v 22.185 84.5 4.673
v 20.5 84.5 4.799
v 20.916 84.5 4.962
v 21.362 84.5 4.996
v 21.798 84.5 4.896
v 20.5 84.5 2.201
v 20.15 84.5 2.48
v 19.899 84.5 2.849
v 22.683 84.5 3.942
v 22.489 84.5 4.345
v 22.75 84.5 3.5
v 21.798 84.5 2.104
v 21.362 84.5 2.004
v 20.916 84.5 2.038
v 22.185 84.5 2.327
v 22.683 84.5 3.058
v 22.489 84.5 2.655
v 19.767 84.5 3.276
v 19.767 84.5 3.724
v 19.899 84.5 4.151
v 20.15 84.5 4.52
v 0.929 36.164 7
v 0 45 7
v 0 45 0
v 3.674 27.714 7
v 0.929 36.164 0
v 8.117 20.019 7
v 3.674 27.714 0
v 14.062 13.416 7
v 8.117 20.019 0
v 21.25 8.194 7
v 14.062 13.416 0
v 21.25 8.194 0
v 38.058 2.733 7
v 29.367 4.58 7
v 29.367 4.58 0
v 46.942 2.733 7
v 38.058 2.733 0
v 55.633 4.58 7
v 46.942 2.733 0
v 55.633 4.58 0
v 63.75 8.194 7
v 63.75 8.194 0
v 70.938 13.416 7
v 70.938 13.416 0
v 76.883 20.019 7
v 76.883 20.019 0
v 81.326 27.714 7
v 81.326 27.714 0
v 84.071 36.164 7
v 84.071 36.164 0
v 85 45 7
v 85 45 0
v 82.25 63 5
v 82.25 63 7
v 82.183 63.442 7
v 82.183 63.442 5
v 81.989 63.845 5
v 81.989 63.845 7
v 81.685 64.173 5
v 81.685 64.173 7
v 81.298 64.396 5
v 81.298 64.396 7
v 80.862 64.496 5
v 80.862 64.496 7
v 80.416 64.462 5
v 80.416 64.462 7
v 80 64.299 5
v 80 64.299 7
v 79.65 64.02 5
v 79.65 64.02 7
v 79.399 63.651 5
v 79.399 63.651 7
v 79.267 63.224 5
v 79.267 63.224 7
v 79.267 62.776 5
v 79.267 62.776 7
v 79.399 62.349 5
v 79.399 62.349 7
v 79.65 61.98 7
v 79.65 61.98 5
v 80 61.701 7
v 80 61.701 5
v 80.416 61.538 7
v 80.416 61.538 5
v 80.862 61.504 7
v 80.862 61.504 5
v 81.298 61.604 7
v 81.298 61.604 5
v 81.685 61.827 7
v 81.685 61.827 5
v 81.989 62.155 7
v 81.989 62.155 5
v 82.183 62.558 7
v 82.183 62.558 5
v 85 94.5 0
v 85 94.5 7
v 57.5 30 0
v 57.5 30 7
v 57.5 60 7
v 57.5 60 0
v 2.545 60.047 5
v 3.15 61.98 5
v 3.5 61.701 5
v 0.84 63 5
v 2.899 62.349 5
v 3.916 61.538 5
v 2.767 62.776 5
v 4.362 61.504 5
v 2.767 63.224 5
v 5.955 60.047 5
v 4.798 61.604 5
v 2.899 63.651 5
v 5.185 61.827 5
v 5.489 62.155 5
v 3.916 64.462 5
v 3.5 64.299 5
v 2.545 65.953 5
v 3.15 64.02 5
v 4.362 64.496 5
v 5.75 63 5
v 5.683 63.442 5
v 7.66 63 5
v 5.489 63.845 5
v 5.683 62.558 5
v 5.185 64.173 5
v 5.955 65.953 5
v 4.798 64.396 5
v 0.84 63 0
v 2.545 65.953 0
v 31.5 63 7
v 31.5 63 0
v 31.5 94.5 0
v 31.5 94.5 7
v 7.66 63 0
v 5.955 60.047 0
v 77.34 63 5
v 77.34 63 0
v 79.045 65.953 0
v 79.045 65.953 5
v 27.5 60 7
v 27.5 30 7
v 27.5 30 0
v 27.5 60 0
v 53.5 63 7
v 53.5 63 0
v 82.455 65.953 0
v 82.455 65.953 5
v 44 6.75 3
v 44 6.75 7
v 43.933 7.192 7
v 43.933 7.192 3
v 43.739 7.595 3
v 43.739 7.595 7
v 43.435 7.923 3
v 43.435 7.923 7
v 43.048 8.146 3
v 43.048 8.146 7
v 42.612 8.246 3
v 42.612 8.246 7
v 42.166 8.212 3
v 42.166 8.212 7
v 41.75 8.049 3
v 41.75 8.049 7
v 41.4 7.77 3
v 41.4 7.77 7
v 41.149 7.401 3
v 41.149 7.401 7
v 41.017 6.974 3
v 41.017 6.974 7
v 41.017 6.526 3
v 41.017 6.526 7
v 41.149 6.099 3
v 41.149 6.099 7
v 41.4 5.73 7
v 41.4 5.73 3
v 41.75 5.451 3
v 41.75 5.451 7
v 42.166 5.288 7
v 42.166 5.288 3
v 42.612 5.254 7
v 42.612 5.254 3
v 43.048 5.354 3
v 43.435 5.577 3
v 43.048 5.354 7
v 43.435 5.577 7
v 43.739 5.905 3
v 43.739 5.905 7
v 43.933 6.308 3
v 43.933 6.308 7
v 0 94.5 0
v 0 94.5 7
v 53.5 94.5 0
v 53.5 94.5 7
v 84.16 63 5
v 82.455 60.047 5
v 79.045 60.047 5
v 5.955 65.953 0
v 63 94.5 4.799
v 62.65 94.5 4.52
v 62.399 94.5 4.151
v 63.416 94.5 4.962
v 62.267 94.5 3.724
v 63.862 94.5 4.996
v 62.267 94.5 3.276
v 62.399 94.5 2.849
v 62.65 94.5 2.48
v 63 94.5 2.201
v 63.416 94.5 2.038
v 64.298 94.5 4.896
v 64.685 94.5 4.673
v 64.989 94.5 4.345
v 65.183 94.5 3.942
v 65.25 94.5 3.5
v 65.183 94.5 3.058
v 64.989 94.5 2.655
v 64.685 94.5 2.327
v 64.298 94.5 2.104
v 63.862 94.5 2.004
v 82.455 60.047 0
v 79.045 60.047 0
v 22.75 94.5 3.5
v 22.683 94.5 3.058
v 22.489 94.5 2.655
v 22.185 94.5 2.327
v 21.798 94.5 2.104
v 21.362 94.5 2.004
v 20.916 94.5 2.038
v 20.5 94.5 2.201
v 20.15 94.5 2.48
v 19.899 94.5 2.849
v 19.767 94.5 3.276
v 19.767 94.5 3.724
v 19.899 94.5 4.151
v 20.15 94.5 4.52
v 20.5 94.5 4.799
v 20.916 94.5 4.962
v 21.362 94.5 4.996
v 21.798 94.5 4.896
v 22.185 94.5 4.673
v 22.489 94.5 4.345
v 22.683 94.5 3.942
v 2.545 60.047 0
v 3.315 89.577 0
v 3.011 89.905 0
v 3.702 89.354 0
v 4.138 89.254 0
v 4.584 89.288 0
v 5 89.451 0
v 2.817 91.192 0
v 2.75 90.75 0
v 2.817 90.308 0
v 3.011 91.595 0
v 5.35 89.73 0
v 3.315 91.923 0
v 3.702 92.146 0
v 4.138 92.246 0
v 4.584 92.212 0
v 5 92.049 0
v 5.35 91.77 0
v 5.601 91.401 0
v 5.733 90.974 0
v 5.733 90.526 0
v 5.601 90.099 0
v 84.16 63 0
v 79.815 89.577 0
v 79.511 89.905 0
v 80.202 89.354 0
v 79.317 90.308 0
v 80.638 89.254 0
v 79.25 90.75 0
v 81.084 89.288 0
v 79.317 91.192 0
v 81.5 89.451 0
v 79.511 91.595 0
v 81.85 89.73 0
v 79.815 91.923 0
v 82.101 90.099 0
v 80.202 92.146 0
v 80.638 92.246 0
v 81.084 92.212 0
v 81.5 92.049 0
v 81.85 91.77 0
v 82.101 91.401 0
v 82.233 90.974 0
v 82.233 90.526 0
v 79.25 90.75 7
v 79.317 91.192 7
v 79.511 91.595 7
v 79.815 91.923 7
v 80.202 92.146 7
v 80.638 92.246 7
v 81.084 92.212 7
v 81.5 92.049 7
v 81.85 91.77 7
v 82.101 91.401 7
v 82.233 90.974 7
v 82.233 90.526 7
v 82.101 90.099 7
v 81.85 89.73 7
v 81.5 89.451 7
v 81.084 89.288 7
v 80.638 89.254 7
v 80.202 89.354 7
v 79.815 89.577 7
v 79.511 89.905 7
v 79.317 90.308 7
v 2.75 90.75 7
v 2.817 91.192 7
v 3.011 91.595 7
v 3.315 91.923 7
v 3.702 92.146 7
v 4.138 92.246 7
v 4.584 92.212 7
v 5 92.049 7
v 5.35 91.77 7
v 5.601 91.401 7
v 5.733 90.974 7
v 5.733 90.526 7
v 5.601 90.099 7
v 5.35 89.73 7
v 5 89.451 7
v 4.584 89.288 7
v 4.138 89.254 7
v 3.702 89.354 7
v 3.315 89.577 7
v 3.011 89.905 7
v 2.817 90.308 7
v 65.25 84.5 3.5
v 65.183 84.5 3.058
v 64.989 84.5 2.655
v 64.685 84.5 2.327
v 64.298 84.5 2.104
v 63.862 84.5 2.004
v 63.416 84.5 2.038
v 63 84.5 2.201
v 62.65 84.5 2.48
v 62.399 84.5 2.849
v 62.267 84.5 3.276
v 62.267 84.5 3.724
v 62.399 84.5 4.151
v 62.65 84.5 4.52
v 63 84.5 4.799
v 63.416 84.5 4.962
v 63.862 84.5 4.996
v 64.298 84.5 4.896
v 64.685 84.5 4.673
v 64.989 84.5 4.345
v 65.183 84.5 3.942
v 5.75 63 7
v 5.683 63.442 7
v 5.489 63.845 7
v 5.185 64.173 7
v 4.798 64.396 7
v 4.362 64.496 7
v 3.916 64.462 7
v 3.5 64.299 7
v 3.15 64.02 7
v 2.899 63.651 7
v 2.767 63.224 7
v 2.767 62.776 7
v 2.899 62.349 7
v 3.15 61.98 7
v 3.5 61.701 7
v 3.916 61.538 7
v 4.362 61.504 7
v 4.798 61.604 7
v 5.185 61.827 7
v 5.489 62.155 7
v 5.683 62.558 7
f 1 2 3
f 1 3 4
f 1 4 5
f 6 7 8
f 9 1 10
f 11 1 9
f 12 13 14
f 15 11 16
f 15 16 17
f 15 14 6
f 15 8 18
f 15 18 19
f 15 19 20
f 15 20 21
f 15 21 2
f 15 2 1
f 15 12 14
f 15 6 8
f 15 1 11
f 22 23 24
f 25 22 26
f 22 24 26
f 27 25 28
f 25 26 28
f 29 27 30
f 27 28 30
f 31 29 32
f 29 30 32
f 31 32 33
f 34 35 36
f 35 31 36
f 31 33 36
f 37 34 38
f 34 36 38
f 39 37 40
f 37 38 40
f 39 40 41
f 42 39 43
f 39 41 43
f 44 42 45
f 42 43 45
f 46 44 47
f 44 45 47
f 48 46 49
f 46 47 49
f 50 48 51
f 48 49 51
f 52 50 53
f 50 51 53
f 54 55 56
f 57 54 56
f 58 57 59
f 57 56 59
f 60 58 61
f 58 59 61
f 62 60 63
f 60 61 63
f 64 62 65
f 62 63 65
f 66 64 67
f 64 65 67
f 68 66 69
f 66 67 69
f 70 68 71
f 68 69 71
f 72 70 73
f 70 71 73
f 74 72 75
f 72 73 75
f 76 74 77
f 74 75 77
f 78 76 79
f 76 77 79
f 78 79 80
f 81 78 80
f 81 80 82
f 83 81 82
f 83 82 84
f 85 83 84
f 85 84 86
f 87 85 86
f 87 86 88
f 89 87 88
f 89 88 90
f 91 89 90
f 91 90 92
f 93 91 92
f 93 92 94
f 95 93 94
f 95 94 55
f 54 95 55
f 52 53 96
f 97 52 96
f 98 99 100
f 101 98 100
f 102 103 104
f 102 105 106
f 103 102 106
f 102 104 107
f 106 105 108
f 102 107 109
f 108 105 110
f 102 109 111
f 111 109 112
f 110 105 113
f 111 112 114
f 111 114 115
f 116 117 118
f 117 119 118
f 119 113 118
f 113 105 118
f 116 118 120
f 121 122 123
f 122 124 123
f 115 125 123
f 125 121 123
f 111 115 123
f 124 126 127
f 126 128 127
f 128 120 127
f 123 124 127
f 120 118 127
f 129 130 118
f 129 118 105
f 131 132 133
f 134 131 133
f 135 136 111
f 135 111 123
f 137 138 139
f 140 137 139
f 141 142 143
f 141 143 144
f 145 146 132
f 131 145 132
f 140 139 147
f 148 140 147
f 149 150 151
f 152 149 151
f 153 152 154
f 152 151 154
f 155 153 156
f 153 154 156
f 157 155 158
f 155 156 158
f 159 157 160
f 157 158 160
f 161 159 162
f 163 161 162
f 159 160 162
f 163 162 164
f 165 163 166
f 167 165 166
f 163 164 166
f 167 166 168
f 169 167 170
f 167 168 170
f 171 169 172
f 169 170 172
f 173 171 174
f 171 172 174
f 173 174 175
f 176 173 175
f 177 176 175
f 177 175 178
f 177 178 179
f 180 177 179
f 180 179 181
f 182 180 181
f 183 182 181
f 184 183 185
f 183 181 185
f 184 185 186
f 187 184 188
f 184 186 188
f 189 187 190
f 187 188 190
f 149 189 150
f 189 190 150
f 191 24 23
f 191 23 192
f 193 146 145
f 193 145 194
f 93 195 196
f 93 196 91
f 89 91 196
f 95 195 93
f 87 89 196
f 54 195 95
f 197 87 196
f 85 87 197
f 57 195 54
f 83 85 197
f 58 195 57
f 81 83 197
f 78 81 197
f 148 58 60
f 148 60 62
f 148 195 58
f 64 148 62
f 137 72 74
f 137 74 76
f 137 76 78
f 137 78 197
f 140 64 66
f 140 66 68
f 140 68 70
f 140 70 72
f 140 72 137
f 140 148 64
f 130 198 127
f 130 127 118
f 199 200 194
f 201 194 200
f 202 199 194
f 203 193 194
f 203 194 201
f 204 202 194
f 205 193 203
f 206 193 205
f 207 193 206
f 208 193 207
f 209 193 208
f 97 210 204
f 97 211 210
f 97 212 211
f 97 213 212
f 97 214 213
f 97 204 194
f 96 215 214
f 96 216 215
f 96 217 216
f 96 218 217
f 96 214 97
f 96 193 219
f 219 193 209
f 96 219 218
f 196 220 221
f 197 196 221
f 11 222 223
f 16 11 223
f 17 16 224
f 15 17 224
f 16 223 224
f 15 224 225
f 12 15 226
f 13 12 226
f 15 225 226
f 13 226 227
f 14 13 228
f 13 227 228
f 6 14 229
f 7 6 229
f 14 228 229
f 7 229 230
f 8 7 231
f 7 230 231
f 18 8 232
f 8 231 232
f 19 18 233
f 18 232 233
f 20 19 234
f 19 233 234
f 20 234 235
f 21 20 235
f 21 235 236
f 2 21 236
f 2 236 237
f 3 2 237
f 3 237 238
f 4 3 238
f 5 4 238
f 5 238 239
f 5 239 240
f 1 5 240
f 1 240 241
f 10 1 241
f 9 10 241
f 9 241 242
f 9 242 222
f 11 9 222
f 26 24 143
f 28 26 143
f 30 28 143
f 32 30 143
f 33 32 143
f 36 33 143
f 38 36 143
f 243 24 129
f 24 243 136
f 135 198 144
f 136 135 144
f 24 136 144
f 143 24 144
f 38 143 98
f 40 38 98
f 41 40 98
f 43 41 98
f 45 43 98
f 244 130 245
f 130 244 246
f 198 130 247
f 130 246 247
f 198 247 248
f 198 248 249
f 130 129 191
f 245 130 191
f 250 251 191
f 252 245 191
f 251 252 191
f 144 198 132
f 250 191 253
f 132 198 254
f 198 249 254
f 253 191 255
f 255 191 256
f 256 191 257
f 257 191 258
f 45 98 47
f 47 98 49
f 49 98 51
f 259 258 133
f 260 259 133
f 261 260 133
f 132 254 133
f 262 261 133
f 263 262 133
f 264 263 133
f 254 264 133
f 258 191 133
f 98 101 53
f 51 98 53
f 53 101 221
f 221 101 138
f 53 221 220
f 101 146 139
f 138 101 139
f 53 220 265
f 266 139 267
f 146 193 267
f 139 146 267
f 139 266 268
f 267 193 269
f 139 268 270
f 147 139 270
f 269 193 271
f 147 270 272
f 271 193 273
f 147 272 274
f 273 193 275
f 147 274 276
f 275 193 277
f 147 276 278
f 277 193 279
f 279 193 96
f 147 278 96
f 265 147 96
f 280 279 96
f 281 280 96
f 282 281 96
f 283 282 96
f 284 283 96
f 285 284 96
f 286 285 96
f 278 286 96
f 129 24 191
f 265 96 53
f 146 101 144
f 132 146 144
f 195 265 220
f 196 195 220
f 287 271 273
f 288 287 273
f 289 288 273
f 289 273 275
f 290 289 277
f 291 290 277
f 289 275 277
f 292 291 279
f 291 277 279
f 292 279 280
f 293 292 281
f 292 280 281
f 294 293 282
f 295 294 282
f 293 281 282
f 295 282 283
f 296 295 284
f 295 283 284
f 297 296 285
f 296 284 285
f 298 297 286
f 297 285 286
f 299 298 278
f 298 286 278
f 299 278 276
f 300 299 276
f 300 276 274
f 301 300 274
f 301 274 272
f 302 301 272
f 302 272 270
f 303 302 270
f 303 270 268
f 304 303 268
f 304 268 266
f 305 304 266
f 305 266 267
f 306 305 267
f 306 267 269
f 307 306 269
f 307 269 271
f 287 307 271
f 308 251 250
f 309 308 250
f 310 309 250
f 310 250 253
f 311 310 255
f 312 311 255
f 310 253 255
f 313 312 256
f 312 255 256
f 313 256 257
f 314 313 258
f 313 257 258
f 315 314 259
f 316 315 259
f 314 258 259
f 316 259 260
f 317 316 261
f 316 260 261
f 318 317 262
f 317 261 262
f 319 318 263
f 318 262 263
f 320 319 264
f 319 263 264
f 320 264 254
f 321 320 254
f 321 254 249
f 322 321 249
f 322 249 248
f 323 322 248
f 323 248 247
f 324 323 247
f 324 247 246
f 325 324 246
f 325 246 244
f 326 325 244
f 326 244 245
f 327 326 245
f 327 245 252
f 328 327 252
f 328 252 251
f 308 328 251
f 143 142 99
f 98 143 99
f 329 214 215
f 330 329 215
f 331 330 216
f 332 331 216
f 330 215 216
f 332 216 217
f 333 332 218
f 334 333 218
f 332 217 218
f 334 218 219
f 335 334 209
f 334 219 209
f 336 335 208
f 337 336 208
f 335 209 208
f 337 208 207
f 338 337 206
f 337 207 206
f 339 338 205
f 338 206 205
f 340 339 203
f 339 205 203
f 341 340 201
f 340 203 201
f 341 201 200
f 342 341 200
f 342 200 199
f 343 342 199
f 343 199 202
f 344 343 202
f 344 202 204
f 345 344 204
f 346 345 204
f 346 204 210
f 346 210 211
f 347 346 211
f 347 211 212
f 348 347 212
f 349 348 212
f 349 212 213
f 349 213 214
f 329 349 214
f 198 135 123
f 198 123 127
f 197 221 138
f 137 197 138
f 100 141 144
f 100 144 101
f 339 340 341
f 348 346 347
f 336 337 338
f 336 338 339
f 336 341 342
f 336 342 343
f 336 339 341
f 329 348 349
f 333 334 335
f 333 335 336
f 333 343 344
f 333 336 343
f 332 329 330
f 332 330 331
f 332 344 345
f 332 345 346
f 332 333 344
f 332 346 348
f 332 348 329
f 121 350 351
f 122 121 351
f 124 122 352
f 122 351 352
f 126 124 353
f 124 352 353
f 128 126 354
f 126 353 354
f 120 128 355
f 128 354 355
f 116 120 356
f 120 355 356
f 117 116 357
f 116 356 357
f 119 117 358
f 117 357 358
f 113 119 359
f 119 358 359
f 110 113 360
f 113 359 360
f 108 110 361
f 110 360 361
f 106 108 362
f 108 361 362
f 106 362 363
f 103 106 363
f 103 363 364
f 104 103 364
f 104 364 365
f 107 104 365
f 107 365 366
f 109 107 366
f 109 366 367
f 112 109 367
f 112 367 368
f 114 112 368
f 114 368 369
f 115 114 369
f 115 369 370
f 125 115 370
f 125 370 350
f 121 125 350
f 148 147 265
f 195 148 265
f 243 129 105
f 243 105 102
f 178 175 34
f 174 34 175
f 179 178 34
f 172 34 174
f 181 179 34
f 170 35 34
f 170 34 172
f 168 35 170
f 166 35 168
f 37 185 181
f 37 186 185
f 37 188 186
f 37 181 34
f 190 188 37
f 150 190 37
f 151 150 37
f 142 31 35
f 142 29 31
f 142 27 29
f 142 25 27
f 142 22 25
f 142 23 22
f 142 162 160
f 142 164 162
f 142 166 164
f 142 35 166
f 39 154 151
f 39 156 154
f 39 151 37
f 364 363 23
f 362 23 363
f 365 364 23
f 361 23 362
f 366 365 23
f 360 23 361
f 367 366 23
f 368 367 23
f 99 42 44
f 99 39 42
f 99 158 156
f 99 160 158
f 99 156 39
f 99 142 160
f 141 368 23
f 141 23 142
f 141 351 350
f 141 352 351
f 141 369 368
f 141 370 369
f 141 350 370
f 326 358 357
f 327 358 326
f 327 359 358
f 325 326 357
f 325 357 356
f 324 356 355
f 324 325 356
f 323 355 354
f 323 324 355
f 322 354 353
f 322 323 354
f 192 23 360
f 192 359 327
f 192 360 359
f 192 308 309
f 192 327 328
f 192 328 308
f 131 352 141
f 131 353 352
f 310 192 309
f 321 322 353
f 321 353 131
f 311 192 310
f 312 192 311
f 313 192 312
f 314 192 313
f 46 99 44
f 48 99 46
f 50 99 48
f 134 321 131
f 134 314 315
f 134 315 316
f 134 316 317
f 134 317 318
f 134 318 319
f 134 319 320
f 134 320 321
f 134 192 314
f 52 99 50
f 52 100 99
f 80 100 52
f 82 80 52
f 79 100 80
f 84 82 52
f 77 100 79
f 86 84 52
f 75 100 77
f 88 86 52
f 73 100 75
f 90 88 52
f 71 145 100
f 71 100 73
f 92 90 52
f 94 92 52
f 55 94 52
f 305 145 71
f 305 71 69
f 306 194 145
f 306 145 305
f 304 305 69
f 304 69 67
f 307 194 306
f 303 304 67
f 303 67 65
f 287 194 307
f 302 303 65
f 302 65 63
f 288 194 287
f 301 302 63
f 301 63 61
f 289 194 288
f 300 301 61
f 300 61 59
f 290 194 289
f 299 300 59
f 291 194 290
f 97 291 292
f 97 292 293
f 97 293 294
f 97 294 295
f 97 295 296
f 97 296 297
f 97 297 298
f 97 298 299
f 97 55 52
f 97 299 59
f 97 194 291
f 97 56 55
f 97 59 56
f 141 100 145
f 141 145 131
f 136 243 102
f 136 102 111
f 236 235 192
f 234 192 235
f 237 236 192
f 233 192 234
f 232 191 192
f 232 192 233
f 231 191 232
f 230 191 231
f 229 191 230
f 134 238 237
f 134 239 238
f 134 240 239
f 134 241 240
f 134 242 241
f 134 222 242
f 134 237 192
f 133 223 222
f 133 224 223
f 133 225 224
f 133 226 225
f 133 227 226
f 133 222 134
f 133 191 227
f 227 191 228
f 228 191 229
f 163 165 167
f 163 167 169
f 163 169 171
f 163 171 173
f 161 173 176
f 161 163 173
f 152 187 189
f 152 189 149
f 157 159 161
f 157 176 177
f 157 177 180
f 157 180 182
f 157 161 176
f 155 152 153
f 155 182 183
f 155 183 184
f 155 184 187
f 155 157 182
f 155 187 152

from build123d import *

# Parameters (mm, degrees)
SKETCH1_W           = 85
SKETCH1_H           = 95
BOSS_EXTRUDE1_DEPTH = 7
SKETCH2_W           = 30
SKETCH2_H           = 30
CUT_EXTRUDE1_DEPTH  = 7
SKETCH4_R           = 1.5
CUT_EXTRUDE2_DEPTH  = 10.5
SKETCH6_R           = 1.5
CUT_EXTRUDE3_DEPTH  = 8
CUT_EXTRUDE4_DEPTH  = 10
SKETCH8_R           = 1.5
CUT_EXTRUDE5_DEPTH  = 10
CUT_EXTRUDE6_DEPTH  = 5
SKETCH11_R          = 1.5
CUT_EXTRUDE8_DEPTH  = 4
SKETCH12_W          = 22
SKETCH12_H          = 32
CUT_EXTRUDE9_DEPTH  = 10
SKETCH13_W          = 31.5
SKETCH13_H          = 7
SKETCH13_R          = 1.5
CUT_EXTRUDE10_DEPTH = 0.5


with BuildPart() as part:
    # Sketch1 → Boss-Extrude1 (new body)
    with BuildSketch(Plane.XY):
        with Locations((42.5, 47.5)):
            Rectangle(SKETCH1_W, SKETCH1_H)
    extrude(amount=BOSS_EXTRUDE1_DEPTH)

    # Sketch2 → Cut-Extrude1 (cut)
    with BuildSketch(Plane.XY.offset(7)):
        with Locations((42.5, 45)):
            Rectangle(SKETCH2_W, SKETCH2_H)
    extrude(amount=-CUT_EXTRUDE1_DEPTH, mode=Mode.SUBTRACT)

    # Sketch4 → Cut-Extrude2 (cut)
    with BuildSketch(Plane(origin=(0, 95, 0), x_dir=(1, 0, 0), z_dir=(0, 1, 0))):
        with Locations((21.25, -3.5)):
            Circle(SKETCH4_R)
        with Locations((63.75, -3.5)):
            Circle(SKETCH4_R)
    extrude(amount=-CUT_EXTRUDE2_DEPTH, mode=Mode.SUBTRACT)

    # Sketch6 → Cut-Extrude3 (cut)
    with BuildSketch(Plane(origin=(0, 0, 0), x_dir=(-1, 0, 0), z_dir=(0, 0, -1))):
        with Locations((-80.75, 90.75)):
            Circle(SKETCH6_R)
        with Locations((-4.25, 90.75)):
            Circle(SKETCH6_R)
        with Locations((-4.45, 4.25)):
            Circle(SKETCH6_R)
        with Locations((-80.75, 7.25)):
            Circle(SKETCH6_R)
    extrude(amount=-CUT_EXTRUDE3_DEPTH, mode=Mode.SUBTRACT)

    # Sketch7 → Cut-Extrude4 (cut)
    with BuildSketch(Plane(origin=(0, 0, 0), x_dir=(-1, 0, 0), z_dir=(0, 0, -1))):
        with BuildLine():
            Line((-85, 45), (-85, 0))
            Line((-85, 0), (0, 0))
            Line((0, 0), (0, 45))
            ThreePointArc((0, 45), (-42.5, 2.5), (-85, 45))
        make_face()
    extrude(amount=-CUT_EXTRUDE4_DEPTH, mode=Mode.SUBTRACT)

    # Sketch8 → Cut-Extrude5 (cut)
    with BuildSketch(Plane.XY.offset(7)):
        with Locations((80.75, 63)):
            Circle(SKETCH8_R)
        with Locations((4.25, 63)):
            Circle(SKETCH8_R)
    extrude(amount=-CUT_EXTRUDE5_DEPTH, mode=Mode.SUBTRACT)

    # Sketch9 → Cut-Extrude6 (cut)
    with BuildSketch(Plane(origin=(0, 0, 0), x_dir=(-1, 0, 0), z_dir=(0, 0, -1))):
        Polygon((-79.045, 65.953146627), (-82.455, 65.953146627), (-84.16, 63), (-82.455, 60.046853373), (-79.045, 60.046853373), (-77.34, 63), align=None)
        Polygon((-0.84, 63), (-2.545, 60.046853373), (-5.955, 60.046853373), (-7.66, 63), (-5.955, 65.953146627), (-2.545, 65.953146627), align=None)
    extrude(amount=-CUT_EXTRUDE6_DEPTH, mode=Mode.SUBTRACT)

    # Sketch11 → Cut-Extrude8 (cut)
    with BuildSketch(Plane.XY.offset(7)):
        with Locations((42.5, 6.75)):
            Circle(SKETCH11_R)
    extrude(amount=-CUT_EXTRUDE8_DEPTH, mode=Mode.SUBTRACT)

    # Sketch12 → Cut-Extrude9 (cut)
    with BuildSketch(Plane(origin=(0, 0, 0), x_dir=(-1, 0, 0), z_dir=(0, 0, -1))):
        with Locations((-42.5, 79)):
            Rectangle(SKETCH12_W, SKETCH12_H)
    extrude(amount=-CUT_EXTRUDE9_DEPTH, mode=Mode.SUBTRACT)

    # Sketch13 → Cut-Extrude10 (cut)
    with BuildSketch(Plane(origin=(0, 95, 0), x_dir=(1, 0, 0), z_dir=(0, 1, 0))):
        with Locations((15.75, -3.5)):
            Rectangle(SKETCH13_W, SKETCH13_H)
        with Locations((21.25, -3.5)):
            Circle(SKETCH13_R, mode=Mode.SUBTRACT)
        with Locations((69.25, -3.5)):
            Rectangle(SKETCH13_W, SKETCH13_H)
        with Locations((63.75, -3.5)):
            Circle(SKETCH13_R, mode=Mode.SUBTRACT)
    extrude(amount=-CUT_EXTRUDE10_DEPTH, mode=Mode.SUBTRACT)


solid = part.part
